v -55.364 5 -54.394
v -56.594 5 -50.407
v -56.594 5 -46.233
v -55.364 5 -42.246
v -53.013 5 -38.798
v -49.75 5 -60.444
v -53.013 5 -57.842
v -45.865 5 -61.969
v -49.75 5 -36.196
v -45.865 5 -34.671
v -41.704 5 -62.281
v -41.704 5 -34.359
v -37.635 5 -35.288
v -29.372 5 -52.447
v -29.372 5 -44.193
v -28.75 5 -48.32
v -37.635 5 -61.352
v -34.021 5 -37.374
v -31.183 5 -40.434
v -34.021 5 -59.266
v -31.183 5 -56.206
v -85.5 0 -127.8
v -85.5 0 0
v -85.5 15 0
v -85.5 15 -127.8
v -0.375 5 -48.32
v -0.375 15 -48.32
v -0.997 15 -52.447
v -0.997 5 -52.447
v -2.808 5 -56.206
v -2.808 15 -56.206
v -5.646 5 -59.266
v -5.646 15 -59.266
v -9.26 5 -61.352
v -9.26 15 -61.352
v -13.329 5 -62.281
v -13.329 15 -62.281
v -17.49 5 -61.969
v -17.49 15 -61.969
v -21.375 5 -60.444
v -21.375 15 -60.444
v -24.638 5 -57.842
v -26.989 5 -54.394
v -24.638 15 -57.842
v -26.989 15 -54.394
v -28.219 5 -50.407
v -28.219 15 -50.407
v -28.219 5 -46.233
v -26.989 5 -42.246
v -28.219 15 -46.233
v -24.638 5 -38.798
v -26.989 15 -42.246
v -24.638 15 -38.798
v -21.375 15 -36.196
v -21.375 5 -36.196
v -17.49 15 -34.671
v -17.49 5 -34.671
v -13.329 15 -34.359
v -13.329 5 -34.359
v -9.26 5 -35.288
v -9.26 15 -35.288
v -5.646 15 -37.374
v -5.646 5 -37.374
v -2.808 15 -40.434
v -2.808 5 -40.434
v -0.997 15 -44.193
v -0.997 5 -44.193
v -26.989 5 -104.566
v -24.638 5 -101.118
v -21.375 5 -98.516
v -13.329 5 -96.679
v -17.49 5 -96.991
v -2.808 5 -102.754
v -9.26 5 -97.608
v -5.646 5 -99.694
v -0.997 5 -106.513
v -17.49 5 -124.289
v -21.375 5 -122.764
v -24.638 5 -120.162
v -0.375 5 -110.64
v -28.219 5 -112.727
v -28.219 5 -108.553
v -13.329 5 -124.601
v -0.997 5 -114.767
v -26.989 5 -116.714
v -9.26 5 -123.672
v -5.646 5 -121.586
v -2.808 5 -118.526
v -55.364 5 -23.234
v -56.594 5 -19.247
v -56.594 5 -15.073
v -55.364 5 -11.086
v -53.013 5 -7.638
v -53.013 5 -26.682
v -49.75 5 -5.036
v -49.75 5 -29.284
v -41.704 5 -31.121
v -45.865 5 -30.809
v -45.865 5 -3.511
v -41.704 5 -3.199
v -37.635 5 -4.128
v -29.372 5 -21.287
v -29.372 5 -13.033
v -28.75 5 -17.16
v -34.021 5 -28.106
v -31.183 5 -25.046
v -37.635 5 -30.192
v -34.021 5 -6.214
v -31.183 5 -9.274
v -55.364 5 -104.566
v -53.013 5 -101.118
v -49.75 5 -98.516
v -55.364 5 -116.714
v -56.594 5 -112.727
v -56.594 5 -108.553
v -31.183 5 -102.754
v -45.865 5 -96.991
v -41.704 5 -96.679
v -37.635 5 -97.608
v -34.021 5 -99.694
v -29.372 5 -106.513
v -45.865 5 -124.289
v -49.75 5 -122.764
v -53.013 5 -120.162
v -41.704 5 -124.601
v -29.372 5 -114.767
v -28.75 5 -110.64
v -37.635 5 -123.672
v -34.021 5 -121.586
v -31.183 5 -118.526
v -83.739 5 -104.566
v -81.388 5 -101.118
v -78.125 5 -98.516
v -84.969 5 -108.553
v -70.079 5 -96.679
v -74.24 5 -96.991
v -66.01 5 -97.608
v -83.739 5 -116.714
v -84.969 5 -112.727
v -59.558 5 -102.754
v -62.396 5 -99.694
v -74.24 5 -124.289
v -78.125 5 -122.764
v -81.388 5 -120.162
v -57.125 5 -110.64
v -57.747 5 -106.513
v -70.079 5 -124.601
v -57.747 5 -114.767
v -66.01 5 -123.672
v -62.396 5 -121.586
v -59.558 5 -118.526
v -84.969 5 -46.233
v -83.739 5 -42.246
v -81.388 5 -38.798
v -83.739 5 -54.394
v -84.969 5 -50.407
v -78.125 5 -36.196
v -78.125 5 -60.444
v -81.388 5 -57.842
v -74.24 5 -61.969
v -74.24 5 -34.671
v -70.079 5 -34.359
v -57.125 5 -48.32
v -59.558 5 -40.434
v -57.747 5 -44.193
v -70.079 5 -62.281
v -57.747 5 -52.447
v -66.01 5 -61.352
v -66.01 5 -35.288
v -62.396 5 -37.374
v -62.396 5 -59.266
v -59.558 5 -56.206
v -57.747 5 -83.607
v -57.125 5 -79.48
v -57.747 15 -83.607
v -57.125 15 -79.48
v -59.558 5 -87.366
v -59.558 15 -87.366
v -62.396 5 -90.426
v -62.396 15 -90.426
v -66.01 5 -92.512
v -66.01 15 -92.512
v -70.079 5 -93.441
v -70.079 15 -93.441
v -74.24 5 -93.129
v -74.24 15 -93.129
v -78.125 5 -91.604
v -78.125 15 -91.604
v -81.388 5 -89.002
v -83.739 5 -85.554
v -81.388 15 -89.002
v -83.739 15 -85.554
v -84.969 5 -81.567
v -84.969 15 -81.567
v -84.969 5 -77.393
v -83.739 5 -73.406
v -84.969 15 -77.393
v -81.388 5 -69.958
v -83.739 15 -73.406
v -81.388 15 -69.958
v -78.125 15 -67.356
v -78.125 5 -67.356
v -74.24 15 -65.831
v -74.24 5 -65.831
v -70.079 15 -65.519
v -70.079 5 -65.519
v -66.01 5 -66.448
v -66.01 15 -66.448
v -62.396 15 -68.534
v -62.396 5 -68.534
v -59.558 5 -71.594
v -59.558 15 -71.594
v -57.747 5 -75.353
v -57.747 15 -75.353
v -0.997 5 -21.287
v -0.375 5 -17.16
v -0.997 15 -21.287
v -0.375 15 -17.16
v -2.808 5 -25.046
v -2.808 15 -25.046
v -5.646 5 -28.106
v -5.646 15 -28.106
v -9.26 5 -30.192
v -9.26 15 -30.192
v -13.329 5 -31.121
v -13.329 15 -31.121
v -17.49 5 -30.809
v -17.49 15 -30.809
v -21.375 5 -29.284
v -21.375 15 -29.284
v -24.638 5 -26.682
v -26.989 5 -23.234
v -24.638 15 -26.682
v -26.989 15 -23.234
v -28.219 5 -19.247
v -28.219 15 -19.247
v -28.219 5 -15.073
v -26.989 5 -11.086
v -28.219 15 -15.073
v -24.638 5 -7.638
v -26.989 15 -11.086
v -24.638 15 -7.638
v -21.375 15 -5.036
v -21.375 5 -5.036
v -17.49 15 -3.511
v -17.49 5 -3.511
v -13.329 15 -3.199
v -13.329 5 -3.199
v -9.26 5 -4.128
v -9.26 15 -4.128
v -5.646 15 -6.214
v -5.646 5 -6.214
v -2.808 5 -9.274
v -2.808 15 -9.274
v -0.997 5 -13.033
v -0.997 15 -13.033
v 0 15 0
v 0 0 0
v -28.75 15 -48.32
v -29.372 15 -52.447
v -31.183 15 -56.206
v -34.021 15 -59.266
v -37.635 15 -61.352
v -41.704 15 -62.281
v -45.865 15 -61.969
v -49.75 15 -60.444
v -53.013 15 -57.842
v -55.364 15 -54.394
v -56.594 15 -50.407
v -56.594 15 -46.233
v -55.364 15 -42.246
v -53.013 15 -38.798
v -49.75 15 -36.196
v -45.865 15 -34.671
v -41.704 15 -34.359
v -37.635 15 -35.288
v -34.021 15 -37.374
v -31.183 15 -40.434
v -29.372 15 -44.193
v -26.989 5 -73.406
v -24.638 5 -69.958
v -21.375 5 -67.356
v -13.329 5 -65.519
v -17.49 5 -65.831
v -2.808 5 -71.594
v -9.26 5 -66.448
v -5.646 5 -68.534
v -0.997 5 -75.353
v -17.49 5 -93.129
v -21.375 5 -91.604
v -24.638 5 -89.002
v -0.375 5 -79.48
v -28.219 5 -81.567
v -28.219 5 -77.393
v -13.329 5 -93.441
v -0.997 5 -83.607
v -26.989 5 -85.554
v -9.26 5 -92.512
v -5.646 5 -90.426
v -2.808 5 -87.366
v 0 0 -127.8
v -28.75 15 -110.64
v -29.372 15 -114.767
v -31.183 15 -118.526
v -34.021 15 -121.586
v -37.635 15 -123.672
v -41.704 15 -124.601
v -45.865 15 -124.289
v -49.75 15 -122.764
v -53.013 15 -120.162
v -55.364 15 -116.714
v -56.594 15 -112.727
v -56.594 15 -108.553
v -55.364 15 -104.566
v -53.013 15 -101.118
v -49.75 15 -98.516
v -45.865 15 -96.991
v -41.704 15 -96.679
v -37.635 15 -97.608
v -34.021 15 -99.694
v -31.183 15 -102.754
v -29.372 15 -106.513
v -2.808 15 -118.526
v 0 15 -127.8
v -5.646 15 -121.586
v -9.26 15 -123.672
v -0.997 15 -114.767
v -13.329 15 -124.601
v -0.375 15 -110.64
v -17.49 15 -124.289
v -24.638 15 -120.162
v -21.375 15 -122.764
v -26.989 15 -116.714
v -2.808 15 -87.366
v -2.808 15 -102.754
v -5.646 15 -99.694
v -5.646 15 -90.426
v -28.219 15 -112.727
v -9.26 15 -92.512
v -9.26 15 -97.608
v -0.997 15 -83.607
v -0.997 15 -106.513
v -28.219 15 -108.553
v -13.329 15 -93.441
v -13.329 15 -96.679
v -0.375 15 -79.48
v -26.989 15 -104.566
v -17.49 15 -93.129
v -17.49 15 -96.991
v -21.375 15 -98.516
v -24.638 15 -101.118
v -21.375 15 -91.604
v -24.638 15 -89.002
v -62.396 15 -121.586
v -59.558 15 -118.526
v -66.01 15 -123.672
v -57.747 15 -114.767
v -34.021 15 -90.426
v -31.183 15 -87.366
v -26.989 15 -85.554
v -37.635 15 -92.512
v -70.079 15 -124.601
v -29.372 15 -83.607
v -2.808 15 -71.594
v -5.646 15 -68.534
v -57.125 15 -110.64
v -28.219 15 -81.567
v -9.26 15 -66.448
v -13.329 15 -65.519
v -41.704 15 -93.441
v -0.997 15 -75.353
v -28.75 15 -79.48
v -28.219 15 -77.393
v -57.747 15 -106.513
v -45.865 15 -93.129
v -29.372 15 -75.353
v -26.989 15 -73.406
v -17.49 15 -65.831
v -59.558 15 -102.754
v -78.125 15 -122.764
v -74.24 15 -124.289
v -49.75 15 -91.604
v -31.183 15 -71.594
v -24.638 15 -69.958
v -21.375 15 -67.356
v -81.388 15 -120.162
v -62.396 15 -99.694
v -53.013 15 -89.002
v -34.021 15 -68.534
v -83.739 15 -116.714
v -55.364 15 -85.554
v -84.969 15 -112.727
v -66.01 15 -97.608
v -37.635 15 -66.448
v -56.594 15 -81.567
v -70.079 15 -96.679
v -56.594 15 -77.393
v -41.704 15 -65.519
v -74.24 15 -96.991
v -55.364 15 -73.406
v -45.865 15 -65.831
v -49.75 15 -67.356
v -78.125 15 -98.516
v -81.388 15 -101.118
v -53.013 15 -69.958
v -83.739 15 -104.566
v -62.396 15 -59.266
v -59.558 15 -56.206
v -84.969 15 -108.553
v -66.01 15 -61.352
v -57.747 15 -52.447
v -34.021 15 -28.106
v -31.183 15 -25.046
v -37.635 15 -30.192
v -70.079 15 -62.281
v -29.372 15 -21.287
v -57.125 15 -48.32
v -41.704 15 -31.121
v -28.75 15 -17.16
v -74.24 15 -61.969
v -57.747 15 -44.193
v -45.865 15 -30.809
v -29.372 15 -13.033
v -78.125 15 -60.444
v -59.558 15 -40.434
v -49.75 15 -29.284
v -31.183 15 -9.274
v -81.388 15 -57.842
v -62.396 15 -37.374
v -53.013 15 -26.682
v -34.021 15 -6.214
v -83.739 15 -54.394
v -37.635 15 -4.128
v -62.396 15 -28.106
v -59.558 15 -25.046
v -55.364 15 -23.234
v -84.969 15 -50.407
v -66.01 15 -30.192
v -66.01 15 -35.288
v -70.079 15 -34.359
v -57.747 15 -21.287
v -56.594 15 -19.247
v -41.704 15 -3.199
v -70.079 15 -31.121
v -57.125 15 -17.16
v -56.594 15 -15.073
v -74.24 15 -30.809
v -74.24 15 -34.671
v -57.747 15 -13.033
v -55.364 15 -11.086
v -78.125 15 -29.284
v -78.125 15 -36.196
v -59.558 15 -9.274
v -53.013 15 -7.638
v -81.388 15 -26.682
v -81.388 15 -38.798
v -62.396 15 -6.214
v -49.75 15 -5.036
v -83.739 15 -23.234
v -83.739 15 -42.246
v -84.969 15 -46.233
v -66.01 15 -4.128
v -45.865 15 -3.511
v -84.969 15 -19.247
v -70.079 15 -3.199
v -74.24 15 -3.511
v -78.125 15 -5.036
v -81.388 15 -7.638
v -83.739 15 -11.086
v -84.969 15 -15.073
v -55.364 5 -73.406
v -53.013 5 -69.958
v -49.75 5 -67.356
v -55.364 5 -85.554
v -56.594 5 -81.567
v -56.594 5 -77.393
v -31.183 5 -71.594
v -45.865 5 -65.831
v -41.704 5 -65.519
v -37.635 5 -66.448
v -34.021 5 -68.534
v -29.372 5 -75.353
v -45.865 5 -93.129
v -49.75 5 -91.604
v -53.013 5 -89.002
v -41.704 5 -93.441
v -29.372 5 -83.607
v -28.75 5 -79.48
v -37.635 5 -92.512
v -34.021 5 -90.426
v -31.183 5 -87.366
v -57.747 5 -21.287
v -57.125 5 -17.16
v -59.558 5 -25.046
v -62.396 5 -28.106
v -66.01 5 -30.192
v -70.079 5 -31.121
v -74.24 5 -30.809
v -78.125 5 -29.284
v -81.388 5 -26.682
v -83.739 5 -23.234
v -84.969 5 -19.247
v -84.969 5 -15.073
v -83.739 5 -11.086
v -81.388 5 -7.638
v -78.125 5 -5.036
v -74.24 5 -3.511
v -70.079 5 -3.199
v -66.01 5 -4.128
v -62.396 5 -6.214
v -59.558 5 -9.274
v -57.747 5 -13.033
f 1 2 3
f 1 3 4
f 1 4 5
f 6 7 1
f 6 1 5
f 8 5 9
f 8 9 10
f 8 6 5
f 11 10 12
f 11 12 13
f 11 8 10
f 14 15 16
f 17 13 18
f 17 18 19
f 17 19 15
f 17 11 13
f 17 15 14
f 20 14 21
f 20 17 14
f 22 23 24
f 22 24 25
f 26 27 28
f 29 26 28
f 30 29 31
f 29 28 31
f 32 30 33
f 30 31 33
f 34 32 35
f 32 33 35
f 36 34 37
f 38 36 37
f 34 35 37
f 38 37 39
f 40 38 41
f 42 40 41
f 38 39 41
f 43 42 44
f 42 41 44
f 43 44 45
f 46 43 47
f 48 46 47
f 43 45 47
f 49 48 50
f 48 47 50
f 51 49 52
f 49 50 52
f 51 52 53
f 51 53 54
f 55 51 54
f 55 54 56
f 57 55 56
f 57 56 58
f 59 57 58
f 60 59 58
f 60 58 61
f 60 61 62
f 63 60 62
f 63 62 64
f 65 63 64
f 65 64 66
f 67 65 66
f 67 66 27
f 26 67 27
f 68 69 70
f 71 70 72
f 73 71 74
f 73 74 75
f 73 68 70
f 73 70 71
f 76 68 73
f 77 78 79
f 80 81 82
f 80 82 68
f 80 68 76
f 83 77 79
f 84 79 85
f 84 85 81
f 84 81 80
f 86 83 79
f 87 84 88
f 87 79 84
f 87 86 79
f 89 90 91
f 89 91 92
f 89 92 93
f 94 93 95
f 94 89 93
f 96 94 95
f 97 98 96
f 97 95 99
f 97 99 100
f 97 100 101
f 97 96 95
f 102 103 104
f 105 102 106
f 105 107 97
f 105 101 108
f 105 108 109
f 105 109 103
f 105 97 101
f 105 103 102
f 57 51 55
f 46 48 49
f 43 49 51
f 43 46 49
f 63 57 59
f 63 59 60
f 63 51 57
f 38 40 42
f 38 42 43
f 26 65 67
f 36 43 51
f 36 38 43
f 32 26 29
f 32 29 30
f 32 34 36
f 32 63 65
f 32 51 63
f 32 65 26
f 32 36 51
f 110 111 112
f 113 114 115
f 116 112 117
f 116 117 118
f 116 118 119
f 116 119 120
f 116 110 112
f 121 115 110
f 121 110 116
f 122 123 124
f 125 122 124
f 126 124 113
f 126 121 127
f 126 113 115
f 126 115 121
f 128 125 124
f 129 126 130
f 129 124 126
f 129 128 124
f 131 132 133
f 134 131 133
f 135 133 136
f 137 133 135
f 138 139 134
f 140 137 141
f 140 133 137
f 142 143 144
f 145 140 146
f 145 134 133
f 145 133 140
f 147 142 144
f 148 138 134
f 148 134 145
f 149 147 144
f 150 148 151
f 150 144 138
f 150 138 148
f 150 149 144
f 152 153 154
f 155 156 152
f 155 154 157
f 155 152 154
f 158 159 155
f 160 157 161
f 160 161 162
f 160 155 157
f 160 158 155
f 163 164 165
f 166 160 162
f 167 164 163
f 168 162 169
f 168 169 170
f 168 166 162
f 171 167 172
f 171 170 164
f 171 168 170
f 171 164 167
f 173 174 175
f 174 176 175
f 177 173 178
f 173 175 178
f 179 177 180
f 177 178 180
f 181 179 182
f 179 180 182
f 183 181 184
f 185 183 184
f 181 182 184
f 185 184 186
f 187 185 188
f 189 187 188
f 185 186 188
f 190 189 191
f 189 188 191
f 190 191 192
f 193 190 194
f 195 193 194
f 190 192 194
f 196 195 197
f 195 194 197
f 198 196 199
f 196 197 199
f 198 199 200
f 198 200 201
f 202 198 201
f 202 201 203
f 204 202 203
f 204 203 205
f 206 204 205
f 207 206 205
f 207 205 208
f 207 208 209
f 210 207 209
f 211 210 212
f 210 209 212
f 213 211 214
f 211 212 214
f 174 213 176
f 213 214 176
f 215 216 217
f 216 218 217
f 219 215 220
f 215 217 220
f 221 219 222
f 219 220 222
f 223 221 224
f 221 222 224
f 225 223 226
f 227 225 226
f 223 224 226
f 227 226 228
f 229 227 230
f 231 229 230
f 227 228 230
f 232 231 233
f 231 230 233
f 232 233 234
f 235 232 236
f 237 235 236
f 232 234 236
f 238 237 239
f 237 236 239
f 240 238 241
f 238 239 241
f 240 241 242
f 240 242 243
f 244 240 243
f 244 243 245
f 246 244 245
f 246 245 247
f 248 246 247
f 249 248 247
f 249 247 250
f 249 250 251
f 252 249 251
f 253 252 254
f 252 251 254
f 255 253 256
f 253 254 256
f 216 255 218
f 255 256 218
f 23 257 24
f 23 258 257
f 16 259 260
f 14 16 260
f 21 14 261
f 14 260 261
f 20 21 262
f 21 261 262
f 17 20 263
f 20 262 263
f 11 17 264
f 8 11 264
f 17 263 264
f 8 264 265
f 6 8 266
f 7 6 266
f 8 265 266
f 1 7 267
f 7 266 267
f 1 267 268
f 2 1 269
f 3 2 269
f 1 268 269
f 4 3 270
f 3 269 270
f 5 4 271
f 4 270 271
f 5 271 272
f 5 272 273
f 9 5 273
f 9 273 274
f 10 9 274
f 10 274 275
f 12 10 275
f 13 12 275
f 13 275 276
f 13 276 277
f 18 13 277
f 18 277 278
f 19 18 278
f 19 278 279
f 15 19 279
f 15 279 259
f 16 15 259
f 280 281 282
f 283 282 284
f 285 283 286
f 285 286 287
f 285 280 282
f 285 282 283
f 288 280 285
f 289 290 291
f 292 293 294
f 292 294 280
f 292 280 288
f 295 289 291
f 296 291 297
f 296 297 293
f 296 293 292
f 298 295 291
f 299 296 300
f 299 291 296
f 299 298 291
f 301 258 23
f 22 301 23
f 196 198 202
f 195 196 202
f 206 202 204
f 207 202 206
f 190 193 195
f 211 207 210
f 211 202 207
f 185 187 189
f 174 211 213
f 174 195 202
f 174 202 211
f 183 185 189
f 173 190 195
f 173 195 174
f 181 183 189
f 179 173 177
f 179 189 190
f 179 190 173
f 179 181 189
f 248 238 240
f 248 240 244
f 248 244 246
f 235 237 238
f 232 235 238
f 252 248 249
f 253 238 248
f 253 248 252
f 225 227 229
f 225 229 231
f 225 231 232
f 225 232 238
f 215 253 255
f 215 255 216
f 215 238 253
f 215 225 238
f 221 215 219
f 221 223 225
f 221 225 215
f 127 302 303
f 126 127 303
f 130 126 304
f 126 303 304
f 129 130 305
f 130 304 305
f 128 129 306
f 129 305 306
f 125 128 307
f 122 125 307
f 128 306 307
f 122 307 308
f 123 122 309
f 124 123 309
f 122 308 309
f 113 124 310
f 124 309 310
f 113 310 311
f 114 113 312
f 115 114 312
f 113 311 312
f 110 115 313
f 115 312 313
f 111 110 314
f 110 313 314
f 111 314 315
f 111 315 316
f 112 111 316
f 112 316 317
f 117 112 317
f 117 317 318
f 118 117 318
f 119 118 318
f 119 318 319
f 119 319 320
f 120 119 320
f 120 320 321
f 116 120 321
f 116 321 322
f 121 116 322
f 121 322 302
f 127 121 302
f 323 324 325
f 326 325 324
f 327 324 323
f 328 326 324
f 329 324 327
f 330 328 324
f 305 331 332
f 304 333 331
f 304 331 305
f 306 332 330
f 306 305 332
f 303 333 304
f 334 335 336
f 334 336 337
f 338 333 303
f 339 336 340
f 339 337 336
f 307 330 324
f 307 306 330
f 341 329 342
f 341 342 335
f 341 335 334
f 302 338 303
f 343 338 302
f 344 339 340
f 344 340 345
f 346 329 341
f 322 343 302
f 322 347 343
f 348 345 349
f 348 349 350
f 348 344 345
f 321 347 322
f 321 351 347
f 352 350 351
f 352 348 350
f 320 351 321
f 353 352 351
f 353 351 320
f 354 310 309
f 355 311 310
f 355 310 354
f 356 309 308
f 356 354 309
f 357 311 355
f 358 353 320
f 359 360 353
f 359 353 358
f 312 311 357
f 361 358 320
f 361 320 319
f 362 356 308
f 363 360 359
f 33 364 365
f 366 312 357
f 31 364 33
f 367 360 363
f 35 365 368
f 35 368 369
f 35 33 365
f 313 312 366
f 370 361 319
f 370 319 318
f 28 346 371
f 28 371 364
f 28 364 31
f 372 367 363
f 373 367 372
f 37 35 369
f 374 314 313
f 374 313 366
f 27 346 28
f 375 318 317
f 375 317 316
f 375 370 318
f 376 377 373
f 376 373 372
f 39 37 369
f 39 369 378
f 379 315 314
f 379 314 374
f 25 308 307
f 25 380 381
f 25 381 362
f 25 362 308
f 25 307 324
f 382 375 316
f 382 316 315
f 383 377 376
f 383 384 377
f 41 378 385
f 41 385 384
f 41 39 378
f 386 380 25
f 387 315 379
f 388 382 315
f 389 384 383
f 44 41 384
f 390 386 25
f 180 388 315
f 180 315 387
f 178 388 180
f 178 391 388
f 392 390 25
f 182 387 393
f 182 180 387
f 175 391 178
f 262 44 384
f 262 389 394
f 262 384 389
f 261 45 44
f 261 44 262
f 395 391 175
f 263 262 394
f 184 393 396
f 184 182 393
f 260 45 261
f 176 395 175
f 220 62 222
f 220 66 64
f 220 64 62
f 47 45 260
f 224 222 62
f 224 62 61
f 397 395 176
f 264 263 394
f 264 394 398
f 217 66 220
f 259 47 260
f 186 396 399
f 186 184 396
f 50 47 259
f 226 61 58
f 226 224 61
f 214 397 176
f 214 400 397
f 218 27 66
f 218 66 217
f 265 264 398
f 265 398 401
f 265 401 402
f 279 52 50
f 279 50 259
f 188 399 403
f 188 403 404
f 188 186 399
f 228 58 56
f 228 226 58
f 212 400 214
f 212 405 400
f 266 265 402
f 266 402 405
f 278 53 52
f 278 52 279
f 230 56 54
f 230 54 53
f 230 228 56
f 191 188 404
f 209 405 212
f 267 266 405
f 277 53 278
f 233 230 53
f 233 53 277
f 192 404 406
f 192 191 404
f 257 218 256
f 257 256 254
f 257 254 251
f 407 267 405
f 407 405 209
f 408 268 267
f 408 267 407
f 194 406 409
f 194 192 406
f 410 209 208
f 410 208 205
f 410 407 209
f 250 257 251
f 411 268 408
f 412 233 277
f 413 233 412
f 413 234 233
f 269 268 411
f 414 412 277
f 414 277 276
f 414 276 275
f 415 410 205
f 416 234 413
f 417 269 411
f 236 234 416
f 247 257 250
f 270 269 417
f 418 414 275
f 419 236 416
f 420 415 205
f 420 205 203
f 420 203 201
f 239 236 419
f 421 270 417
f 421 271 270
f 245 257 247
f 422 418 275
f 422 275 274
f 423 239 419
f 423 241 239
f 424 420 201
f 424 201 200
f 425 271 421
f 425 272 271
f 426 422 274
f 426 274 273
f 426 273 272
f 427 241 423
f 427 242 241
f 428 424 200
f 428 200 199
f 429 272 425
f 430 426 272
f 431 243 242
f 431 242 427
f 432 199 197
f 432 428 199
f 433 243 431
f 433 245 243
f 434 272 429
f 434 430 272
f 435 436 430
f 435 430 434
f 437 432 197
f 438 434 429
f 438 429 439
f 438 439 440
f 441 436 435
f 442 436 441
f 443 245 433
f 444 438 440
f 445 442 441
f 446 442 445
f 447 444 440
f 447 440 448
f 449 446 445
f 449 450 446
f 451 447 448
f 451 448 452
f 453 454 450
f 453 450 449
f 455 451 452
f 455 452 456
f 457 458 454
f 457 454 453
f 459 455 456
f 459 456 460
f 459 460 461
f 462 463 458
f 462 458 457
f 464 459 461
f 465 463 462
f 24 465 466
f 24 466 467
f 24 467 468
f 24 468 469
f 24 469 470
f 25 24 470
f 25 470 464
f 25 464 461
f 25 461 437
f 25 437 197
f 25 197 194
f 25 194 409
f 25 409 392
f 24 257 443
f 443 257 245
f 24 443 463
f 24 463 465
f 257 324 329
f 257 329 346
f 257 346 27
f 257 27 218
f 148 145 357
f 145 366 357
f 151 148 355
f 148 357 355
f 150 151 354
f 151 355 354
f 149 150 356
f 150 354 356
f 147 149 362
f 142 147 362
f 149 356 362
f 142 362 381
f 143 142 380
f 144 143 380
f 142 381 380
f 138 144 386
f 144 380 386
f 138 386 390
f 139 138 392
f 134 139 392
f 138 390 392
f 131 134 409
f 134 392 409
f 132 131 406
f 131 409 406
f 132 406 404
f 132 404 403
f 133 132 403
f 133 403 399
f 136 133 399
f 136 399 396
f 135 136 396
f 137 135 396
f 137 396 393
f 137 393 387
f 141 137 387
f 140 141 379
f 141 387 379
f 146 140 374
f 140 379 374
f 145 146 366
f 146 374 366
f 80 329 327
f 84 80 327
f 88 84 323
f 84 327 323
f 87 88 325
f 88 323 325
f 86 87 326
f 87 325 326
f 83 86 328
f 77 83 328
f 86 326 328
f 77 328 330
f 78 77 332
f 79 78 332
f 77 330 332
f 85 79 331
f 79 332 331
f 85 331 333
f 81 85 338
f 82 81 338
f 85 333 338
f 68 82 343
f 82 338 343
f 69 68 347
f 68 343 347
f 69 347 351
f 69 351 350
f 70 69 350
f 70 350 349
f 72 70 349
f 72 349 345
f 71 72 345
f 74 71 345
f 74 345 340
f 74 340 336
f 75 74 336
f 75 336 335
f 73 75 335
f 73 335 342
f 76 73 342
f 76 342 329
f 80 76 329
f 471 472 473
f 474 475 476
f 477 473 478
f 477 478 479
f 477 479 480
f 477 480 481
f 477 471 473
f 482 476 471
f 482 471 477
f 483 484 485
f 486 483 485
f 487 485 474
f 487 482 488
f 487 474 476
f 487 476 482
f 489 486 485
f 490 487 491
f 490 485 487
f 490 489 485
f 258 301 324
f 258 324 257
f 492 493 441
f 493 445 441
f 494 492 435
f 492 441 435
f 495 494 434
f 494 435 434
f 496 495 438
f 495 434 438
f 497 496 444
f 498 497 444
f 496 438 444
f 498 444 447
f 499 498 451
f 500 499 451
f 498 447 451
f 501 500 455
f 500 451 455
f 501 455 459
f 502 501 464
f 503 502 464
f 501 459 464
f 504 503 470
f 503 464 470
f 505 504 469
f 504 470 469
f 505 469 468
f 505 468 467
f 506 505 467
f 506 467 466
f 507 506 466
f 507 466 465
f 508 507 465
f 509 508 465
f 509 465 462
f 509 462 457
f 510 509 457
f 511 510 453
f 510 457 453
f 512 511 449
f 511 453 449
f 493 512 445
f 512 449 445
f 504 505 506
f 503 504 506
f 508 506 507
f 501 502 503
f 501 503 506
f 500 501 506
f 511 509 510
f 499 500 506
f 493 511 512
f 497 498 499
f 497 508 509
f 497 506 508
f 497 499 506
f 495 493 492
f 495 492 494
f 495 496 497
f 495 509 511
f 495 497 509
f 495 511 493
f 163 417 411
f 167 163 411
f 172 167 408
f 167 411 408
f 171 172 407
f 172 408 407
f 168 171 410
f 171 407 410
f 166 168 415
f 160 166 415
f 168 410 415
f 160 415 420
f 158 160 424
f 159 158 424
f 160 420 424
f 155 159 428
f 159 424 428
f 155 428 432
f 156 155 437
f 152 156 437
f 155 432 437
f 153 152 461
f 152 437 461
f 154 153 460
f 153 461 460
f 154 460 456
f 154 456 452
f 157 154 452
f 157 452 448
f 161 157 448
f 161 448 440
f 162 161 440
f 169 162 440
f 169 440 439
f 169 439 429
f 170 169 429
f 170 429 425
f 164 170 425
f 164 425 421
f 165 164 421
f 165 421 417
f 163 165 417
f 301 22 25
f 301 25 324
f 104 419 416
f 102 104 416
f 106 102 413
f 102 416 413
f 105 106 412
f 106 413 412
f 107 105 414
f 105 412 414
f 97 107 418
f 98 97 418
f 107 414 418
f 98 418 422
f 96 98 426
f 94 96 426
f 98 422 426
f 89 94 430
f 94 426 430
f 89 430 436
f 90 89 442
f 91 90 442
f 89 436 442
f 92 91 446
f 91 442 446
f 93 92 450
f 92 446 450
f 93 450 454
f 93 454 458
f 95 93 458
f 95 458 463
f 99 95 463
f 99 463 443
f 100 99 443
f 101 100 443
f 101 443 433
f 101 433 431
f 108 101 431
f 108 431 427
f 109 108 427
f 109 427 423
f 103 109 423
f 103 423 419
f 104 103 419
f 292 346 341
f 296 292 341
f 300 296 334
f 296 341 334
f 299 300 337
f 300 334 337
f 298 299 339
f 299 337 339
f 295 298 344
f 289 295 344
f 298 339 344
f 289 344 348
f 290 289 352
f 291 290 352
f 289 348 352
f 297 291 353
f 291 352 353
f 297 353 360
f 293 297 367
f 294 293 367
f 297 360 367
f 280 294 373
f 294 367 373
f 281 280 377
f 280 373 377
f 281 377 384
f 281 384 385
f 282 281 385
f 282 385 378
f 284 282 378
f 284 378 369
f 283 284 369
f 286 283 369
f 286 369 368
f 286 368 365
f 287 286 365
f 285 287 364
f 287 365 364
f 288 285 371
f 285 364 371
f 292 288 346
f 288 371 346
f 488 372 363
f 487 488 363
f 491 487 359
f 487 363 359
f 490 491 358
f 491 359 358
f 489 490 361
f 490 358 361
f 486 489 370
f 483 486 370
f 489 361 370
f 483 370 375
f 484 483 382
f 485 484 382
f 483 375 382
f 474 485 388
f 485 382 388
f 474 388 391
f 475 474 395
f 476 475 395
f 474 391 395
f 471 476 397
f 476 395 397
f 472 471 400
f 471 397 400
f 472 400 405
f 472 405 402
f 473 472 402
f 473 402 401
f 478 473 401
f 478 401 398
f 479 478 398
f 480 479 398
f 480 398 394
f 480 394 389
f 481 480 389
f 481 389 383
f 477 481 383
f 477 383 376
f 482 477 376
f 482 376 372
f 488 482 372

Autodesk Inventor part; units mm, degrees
ref_plane "YZ Plane" through (0, 0, 0) normal (1, 0, 0) x (0, 1, 0)
ref_plane "XZ Plane" through (0, 0, 0) normal (0, 1, 0) x (-1, 0, 0)
ref_plane "XY Plane" through (0, 0, 0) normal (0, 0, 1) x (1, 0, 0)
sketch "Sketch1" plane through (0, 0, 0) normal (0, 1, 0) x (-1, 0, 0)
  point P0 (0, 0)
sketch "Sketch2" plane through (0, 0, 0) normal (0, 1, 0) x (-1, 0, 0)
  line L0 (0, 0) -> (85.5, 0)
  line L1 (85.5, 0) -> (85.5, -127.8)
  line L2 (85.5, -127.8) -> (0, -127.8)
  line L3 (0, -127.8) -> (0, 0)
  dimension "d0" = 85.5
  dimension "d1" = 127.8
extrude "Extrusion1" add sketch "Sketch2" along normal blind 15
sketch "Sketch3" plane through (0, 15, 0) normal (0, 1, 0) x (1, 0, 0)
  point P0 (0, 0)
sketch "Sketch5" plane through (0, 15, 0) normal (0, 1, 0) x (1, 0, 0)
  line L0 (0, 127.8) -> (-85.5, 127.8) projected
  line L1 (-85.5, 127.8) -> (-85.5, 0) projected
  line L2 (0, 127.8) -> (-85.5, 127.8)
  line L3 (-85.5, 127.8) -> (-85.5, 124.64)
  line L4 (-85.5, 124.64) -> (0, 124.64)
  line L5 (0, 124.64) -> (0, 127.8)
  line L6 (0, 124.64) -> (-85.5, 124.64)
  line L7 (-85.5, 124.64) -> (-85.5, 96.64)
  line L8 (-85.5, 96.64) -> (0, 96.64)
  line L9 (0, 96.64) -> (0, 124.64)
  line L10 (0, 96.64) -> (-85.5, 96.64)
  line L11 (-85.5, 96.64) -> (-85.5, 93.48)
  line L12 (-85.5, 93.48) -> (0, 93.48)
  line L13 (0, 93.48) -> (0, 96.64)
  line L14 (0, 93.48) -> (-85.5, 93.48)
  line L15 (-85.5, 93.48) -> (-85.5, 65.48)
  line L16 (-85.5, 65.48) -> (0, 65.48)
  line L17 (0, 65.48) -> (0, 93.48)
  line L18 (0, 65.48) -> (-85.5, 65.48)
  line L19 (-85.5, 65.48) -> (-85.5, 62.32)
  line L20 (-85.5, 62.32) -> (0, 62.32)
  line L21 (0, 62.32) -> (0, 65.48)
  line L22 (0, 62.32) -> (-85.5, 62.32)
  line L23 (-85.5, 62.32) -> (-85.5, 34.32)
  line L24 (-85.5, 34.32) -> (0, 34.32)
  line L25 (0, 34.32) -> (0, 62.32)
  line L26 (0, 34.32) -> (-85.5, 34.32)
  line L27 (-85.5, 34.32) -> (-85.5, 31.16)
  line L28 (-85.5, 31.16) -> (0, 31.16)
  line L29 (0, 31.16) -> (0, 34.32)
  line L30 (0, 31.16) -> (-85.5, 31.16)
  line L31 (-85.5, 31.16) -> (-85.5, 3.16)
  line L32 (-85.5, 3.16) -> (0, 3.16)
  line L33 (0, 3.16) -> (0, 31.16)
  line L34 (0, 0) -> (0, 127.8) projected
  line L35 (-85.5, 0) -> (0, 0) projected
  line L36 (0, 127.8) -> (-0.375, 127.8)
  line L37 (-0.375, 127.8) -> (-0.375, 0)
  line L38 (-0.375, 0) -> (0, 0)
  line L39 (0, 0) -> (0, 127.8)
  line L40 (-0.375, 0) -> (-28.375, 0)
  line L41 (-28.375, 0) -> (-28.375, 127.8)
  line L42 (-28.375, 127.8) -> (-0.375, 127.8)
  line L43 (-0.375, 127.8) -> (-0.375, 0)
  line L44 (-28.375, 127.8) -> (-28.75, 127.8)
  line L45 (-28.75, 127.8) -> (-28.75, 3.16)
  line L46 (-28.75, 3.16) -> (-28.375, 3.16)
  line L47 (-28.375, 3.16) -> (-28.375, 127.8)
  line L48 (-28.75, 127.8) -> (-56.75, 127.8)
  line L49 (-56.75, 127.8) -> (-56.75, 3.16)
  line L50 (-56.75, 3.16) -> (-28.75, 3.16)
  line L51 (-28.75, 3.16) -> (-28.75, 127.8)
  line L52 (-56.75, 127.8) -> (-57.125, 127.8)
  line L53 (-57.125, 127.8) -> (-57.125, 3.16)
  line L54 (-57.125, 3.16) -> (-56.75, 3.16)
  line L55 (-56.75, 3.16) -> (-56.75, 127.8)
  line L56 (-57.125, 127.8) -> (-85.125, 127.8)
  line L57 (-85.125, 127.8) -> (-85.125, 3.16)
  line L58 (-85.125, 3.16) -> (-57.125, 3.16)
  line L59 (-57.125, 3.16) -> (-57.125, 127.8)
  circle A0 centre (-14.375, 110.64) radius 14
  circle A1 centre (-14.375, 79.48) radius 14
  circle A2 centre (-14.375, 48.32) radius 14
  circle A3 centre (-14.375, 17.16) radius 14
  circle A4 centre (-42.75, 110.64) radius 14
  circle A5 centre (-42.75, 79.48) radius 14
  circle A6 centre (-42.75, 48.32) radius 14
  circle A7 centre (-42.75, 17.16) radius 14
  circle A8 centre (-71.125, 17.16) radius 14
  circle A9 centre (-71.125, 48.32) radius 14
  circle A10 centre (-71.125, 79.48) radius 14
  circle A11 centre (-71.125, 110.64) radius 14
  dimension "d22" = 3.16
  dimension "d23" = 28
  dimension "d24" = 3.16
  dimension "d25" = 28
  dimension "d26" = 3.16
  dimension "d27" = 28
  dimension "d28" = 3.16
  dimension "d29" = 28
  dimension "d30" = 0.375
  dimension "d31" = 28
  dimension "d32" = 0.375
  dimension "d33" = 28
  dimension "d34" = 0.375
  dimension "d35" = 28
extrude "Extrusion3" cut sketch "Sketch5" against normal blind 10 contours A0 | A4 | A1 | A11 | A2 | A5 | A3 | A10 | A6 | A7 | A9 | A8
properties part number "scintillationvialholder2"
